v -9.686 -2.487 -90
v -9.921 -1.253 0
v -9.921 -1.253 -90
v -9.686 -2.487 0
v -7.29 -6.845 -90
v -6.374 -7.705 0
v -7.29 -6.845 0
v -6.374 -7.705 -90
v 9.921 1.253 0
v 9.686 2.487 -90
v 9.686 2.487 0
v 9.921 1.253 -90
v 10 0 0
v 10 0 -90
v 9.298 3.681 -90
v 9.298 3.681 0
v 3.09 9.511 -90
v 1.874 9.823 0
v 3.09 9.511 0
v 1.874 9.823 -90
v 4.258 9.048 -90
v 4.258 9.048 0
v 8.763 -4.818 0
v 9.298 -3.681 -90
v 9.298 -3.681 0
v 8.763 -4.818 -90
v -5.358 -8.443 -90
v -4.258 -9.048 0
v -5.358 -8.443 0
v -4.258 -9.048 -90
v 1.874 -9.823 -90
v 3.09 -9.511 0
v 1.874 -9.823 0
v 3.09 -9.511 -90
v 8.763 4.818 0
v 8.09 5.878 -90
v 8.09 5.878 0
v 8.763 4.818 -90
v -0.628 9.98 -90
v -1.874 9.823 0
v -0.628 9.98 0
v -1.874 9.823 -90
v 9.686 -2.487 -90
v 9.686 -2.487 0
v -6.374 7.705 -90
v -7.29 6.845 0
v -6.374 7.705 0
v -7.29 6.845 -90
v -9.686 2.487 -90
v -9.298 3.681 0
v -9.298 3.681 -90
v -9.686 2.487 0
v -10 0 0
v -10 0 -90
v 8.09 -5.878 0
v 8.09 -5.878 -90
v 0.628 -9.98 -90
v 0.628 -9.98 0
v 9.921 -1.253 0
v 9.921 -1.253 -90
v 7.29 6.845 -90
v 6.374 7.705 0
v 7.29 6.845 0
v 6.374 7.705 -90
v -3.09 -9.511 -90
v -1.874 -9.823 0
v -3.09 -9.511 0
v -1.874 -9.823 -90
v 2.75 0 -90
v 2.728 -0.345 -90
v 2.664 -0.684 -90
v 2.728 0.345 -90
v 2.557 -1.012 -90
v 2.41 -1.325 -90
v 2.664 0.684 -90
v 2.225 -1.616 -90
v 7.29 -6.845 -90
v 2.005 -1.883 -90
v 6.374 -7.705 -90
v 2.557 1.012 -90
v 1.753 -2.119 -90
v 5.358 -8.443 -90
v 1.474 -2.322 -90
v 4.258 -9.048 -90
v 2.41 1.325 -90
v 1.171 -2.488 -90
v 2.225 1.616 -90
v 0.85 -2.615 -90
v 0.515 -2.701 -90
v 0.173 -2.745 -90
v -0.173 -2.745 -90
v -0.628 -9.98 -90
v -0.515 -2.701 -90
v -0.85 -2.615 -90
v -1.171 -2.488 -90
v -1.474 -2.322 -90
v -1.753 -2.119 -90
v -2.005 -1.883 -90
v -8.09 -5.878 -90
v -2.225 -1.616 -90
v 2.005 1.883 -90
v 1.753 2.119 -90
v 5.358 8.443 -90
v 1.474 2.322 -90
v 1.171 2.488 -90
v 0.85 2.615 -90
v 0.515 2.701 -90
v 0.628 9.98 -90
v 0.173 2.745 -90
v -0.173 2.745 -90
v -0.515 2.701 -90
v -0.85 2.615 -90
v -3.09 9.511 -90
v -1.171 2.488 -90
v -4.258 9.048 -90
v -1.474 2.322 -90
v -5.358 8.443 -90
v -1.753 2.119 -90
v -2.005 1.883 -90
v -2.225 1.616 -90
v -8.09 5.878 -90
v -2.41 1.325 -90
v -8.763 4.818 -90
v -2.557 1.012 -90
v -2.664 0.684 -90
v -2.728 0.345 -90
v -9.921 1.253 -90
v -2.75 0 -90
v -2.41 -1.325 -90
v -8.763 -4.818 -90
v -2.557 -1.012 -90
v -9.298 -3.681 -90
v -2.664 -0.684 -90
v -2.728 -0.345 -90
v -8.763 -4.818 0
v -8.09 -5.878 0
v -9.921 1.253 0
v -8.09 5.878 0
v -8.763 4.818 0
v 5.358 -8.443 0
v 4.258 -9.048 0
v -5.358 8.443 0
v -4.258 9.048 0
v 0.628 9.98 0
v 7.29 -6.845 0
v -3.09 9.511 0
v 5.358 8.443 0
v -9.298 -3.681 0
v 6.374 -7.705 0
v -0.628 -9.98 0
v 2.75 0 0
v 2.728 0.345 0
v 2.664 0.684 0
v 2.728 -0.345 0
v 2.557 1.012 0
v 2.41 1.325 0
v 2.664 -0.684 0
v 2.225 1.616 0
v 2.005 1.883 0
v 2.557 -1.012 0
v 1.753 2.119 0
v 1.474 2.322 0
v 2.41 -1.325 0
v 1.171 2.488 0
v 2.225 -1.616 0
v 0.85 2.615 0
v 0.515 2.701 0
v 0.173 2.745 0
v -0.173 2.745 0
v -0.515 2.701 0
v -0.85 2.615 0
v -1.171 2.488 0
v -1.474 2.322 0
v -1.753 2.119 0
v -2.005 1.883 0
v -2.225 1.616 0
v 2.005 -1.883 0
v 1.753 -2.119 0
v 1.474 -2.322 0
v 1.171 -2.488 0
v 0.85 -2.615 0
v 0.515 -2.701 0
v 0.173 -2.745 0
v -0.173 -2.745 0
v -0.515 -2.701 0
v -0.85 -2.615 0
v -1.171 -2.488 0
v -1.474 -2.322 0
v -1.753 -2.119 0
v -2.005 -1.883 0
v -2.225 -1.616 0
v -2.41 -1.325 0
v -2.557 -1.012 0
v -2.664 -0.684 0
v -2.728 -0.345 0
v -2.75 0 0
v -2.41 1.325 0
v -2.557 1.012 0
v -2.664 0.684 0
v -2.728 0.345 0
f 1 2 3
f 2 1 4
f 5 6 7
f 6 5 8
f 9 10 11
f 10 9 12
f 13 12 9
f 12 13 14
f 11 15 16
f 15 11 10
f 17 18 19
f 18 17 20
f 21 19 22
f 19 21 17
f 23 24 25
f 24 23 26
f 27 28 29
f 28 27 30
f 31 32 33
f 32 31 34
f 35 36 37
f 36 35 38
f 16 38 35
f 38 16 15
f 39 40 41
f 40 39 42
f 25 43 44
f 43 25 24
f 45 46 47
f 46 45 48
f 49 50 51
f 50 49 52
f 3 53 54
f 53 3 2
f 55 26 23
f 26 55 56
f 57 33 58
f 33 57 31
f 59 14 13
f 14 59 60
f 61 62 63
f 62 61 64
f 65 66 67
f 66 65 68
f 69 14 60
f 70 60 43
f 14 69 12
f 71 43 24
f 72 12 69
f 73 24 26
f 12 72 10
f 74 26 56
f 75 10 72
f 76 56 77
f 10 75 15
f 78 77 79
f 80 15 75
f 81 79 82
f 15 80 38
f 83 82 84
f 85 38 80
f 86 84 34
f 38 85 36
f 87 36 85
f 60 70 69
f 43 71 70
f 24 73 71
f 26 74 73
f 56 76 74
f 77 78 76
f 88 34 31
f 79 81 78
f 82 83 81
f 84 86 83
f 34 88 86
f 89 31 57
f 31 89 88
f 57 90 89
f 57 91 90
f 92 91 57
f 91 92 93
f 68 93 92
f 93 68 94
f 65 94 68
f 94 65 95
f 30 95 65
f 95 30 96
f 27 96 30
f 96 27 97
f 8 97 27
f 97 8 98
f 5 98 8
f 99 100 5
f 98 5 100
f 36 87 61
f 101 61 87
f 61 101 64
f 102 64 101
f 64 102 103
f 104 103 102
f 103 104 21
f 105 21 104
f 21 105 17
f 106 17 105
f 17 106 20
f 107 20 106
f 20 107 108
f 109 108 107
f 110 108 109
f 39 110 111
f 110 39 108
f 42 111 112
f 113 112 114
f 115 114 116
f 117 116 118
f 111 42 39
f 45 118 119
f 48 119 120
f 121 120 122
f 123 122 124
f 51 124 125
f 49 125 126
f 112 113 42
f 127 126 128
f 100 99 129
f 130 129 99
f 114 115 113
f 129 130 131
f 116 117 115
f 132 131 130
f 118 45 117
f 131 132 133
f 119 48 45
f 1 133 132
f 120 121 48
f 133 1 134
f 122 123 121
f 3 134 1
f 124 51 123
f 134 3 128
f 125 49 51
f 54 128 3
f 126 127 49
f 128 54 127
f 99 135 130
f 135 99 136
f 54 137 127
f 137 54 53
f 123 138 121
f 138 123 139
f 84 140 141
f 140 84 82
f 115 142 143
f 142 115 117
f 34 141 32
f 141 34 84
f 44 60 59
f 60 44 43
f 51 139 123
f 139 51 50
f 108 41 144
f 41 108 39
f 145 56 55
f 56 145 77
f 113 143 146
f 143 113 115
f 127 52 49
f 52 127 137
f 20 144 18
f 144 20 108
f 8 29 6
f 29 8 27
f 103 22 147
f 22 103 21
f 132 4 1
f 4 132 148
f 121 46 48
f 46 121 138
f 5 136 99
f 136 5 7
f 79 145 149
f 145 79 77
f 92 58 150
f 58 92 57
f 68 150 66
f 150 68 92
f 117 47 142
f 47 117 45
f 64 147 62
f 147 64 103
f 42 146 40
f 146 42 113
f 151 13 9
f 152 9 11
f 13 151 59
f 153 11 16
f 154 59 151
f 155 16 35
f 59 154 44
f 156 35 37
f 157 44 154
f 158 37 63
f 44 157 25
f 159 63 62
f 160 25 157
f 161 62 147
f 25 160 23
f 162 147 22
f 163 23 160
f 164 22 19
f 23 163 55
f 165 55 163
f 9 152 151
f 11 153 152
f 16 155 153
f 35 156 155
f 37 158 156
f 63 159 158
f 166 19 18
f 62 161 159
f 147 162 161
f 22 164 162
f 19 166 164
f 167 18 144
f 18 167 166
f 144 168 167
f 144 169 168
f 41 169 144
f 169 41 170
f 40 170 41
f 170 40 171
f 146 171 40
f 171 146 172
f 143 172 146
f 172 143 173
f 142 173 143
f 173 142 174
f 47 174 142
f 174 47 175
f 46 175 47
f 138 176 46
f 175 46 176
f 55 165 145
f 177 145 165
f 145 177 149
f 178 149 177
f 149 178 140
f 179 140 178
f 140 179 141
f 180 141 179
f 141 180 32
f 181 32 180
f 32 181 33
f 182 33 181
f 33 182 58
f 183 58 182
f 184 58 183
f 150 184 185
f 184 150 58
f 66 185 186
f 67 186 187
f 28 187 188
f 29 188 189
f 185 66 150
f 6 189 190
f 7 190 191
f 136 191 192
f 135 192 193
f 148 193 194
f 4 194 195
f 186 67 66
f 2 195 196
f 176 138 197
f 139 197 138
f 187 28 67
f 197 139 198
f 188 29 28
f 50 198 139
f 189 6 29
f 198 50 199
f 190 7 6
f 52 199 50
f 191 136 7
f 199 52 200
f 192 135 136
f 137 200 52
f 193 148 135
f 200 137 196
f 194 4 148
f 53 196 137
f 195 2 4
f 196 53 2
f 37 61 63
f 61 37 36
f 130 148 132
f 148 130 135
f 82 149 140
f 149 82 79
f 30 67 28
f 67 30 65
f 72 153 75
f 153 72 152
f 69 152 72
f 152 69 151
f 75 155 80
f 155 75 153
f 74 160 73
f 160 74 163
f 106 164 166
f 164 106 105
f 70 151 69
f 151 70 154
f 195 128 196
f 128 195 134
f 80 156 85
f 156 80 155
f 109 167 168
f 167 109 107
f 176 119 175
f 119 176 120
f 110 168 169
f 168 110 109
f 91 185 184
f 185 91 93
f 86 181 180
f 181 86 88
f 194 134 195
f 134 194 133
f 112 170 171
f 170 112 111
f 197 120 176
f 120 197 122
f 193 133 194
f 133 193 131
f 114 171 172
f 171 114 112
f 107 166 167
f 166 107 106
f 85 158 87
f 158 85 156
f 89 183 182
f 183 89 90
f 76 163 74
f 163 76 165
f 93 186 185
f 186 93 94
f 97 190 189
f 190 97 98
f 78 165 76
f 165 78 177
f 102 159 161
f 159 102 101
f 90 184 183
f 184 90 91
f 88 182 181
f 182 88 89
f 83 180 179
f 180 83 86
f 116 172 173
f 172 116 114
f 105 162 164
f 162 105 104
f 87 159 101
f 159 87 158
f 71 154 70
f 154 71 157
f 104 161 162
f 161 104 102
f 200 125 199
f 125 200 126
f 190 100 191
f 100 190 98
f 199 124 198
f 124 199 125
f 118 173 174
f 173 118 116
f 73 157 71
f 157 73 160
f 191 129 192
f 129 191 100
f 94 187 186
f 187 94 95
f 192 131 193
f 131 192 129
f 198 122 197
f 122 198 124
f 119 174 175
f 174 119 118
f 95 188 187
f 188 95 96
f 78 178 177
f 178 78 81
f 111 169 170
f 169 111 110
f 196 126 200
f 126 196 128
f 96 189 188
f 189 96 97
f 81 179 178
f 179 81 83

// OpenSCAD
$fn = 50;


difference() {
	union() {
		translate(v = [0, 0, -90.0000000000]) {
			cylinder(h = 90, r = 10.0000000000);
		}
		cylinder(h = 0, r = 20.0000000000);
	}
	union() {
		#translate(v = [0, 0, -90]) {
			cylinder(h = 90, r = 2.7500000000);
		}
	}
}
